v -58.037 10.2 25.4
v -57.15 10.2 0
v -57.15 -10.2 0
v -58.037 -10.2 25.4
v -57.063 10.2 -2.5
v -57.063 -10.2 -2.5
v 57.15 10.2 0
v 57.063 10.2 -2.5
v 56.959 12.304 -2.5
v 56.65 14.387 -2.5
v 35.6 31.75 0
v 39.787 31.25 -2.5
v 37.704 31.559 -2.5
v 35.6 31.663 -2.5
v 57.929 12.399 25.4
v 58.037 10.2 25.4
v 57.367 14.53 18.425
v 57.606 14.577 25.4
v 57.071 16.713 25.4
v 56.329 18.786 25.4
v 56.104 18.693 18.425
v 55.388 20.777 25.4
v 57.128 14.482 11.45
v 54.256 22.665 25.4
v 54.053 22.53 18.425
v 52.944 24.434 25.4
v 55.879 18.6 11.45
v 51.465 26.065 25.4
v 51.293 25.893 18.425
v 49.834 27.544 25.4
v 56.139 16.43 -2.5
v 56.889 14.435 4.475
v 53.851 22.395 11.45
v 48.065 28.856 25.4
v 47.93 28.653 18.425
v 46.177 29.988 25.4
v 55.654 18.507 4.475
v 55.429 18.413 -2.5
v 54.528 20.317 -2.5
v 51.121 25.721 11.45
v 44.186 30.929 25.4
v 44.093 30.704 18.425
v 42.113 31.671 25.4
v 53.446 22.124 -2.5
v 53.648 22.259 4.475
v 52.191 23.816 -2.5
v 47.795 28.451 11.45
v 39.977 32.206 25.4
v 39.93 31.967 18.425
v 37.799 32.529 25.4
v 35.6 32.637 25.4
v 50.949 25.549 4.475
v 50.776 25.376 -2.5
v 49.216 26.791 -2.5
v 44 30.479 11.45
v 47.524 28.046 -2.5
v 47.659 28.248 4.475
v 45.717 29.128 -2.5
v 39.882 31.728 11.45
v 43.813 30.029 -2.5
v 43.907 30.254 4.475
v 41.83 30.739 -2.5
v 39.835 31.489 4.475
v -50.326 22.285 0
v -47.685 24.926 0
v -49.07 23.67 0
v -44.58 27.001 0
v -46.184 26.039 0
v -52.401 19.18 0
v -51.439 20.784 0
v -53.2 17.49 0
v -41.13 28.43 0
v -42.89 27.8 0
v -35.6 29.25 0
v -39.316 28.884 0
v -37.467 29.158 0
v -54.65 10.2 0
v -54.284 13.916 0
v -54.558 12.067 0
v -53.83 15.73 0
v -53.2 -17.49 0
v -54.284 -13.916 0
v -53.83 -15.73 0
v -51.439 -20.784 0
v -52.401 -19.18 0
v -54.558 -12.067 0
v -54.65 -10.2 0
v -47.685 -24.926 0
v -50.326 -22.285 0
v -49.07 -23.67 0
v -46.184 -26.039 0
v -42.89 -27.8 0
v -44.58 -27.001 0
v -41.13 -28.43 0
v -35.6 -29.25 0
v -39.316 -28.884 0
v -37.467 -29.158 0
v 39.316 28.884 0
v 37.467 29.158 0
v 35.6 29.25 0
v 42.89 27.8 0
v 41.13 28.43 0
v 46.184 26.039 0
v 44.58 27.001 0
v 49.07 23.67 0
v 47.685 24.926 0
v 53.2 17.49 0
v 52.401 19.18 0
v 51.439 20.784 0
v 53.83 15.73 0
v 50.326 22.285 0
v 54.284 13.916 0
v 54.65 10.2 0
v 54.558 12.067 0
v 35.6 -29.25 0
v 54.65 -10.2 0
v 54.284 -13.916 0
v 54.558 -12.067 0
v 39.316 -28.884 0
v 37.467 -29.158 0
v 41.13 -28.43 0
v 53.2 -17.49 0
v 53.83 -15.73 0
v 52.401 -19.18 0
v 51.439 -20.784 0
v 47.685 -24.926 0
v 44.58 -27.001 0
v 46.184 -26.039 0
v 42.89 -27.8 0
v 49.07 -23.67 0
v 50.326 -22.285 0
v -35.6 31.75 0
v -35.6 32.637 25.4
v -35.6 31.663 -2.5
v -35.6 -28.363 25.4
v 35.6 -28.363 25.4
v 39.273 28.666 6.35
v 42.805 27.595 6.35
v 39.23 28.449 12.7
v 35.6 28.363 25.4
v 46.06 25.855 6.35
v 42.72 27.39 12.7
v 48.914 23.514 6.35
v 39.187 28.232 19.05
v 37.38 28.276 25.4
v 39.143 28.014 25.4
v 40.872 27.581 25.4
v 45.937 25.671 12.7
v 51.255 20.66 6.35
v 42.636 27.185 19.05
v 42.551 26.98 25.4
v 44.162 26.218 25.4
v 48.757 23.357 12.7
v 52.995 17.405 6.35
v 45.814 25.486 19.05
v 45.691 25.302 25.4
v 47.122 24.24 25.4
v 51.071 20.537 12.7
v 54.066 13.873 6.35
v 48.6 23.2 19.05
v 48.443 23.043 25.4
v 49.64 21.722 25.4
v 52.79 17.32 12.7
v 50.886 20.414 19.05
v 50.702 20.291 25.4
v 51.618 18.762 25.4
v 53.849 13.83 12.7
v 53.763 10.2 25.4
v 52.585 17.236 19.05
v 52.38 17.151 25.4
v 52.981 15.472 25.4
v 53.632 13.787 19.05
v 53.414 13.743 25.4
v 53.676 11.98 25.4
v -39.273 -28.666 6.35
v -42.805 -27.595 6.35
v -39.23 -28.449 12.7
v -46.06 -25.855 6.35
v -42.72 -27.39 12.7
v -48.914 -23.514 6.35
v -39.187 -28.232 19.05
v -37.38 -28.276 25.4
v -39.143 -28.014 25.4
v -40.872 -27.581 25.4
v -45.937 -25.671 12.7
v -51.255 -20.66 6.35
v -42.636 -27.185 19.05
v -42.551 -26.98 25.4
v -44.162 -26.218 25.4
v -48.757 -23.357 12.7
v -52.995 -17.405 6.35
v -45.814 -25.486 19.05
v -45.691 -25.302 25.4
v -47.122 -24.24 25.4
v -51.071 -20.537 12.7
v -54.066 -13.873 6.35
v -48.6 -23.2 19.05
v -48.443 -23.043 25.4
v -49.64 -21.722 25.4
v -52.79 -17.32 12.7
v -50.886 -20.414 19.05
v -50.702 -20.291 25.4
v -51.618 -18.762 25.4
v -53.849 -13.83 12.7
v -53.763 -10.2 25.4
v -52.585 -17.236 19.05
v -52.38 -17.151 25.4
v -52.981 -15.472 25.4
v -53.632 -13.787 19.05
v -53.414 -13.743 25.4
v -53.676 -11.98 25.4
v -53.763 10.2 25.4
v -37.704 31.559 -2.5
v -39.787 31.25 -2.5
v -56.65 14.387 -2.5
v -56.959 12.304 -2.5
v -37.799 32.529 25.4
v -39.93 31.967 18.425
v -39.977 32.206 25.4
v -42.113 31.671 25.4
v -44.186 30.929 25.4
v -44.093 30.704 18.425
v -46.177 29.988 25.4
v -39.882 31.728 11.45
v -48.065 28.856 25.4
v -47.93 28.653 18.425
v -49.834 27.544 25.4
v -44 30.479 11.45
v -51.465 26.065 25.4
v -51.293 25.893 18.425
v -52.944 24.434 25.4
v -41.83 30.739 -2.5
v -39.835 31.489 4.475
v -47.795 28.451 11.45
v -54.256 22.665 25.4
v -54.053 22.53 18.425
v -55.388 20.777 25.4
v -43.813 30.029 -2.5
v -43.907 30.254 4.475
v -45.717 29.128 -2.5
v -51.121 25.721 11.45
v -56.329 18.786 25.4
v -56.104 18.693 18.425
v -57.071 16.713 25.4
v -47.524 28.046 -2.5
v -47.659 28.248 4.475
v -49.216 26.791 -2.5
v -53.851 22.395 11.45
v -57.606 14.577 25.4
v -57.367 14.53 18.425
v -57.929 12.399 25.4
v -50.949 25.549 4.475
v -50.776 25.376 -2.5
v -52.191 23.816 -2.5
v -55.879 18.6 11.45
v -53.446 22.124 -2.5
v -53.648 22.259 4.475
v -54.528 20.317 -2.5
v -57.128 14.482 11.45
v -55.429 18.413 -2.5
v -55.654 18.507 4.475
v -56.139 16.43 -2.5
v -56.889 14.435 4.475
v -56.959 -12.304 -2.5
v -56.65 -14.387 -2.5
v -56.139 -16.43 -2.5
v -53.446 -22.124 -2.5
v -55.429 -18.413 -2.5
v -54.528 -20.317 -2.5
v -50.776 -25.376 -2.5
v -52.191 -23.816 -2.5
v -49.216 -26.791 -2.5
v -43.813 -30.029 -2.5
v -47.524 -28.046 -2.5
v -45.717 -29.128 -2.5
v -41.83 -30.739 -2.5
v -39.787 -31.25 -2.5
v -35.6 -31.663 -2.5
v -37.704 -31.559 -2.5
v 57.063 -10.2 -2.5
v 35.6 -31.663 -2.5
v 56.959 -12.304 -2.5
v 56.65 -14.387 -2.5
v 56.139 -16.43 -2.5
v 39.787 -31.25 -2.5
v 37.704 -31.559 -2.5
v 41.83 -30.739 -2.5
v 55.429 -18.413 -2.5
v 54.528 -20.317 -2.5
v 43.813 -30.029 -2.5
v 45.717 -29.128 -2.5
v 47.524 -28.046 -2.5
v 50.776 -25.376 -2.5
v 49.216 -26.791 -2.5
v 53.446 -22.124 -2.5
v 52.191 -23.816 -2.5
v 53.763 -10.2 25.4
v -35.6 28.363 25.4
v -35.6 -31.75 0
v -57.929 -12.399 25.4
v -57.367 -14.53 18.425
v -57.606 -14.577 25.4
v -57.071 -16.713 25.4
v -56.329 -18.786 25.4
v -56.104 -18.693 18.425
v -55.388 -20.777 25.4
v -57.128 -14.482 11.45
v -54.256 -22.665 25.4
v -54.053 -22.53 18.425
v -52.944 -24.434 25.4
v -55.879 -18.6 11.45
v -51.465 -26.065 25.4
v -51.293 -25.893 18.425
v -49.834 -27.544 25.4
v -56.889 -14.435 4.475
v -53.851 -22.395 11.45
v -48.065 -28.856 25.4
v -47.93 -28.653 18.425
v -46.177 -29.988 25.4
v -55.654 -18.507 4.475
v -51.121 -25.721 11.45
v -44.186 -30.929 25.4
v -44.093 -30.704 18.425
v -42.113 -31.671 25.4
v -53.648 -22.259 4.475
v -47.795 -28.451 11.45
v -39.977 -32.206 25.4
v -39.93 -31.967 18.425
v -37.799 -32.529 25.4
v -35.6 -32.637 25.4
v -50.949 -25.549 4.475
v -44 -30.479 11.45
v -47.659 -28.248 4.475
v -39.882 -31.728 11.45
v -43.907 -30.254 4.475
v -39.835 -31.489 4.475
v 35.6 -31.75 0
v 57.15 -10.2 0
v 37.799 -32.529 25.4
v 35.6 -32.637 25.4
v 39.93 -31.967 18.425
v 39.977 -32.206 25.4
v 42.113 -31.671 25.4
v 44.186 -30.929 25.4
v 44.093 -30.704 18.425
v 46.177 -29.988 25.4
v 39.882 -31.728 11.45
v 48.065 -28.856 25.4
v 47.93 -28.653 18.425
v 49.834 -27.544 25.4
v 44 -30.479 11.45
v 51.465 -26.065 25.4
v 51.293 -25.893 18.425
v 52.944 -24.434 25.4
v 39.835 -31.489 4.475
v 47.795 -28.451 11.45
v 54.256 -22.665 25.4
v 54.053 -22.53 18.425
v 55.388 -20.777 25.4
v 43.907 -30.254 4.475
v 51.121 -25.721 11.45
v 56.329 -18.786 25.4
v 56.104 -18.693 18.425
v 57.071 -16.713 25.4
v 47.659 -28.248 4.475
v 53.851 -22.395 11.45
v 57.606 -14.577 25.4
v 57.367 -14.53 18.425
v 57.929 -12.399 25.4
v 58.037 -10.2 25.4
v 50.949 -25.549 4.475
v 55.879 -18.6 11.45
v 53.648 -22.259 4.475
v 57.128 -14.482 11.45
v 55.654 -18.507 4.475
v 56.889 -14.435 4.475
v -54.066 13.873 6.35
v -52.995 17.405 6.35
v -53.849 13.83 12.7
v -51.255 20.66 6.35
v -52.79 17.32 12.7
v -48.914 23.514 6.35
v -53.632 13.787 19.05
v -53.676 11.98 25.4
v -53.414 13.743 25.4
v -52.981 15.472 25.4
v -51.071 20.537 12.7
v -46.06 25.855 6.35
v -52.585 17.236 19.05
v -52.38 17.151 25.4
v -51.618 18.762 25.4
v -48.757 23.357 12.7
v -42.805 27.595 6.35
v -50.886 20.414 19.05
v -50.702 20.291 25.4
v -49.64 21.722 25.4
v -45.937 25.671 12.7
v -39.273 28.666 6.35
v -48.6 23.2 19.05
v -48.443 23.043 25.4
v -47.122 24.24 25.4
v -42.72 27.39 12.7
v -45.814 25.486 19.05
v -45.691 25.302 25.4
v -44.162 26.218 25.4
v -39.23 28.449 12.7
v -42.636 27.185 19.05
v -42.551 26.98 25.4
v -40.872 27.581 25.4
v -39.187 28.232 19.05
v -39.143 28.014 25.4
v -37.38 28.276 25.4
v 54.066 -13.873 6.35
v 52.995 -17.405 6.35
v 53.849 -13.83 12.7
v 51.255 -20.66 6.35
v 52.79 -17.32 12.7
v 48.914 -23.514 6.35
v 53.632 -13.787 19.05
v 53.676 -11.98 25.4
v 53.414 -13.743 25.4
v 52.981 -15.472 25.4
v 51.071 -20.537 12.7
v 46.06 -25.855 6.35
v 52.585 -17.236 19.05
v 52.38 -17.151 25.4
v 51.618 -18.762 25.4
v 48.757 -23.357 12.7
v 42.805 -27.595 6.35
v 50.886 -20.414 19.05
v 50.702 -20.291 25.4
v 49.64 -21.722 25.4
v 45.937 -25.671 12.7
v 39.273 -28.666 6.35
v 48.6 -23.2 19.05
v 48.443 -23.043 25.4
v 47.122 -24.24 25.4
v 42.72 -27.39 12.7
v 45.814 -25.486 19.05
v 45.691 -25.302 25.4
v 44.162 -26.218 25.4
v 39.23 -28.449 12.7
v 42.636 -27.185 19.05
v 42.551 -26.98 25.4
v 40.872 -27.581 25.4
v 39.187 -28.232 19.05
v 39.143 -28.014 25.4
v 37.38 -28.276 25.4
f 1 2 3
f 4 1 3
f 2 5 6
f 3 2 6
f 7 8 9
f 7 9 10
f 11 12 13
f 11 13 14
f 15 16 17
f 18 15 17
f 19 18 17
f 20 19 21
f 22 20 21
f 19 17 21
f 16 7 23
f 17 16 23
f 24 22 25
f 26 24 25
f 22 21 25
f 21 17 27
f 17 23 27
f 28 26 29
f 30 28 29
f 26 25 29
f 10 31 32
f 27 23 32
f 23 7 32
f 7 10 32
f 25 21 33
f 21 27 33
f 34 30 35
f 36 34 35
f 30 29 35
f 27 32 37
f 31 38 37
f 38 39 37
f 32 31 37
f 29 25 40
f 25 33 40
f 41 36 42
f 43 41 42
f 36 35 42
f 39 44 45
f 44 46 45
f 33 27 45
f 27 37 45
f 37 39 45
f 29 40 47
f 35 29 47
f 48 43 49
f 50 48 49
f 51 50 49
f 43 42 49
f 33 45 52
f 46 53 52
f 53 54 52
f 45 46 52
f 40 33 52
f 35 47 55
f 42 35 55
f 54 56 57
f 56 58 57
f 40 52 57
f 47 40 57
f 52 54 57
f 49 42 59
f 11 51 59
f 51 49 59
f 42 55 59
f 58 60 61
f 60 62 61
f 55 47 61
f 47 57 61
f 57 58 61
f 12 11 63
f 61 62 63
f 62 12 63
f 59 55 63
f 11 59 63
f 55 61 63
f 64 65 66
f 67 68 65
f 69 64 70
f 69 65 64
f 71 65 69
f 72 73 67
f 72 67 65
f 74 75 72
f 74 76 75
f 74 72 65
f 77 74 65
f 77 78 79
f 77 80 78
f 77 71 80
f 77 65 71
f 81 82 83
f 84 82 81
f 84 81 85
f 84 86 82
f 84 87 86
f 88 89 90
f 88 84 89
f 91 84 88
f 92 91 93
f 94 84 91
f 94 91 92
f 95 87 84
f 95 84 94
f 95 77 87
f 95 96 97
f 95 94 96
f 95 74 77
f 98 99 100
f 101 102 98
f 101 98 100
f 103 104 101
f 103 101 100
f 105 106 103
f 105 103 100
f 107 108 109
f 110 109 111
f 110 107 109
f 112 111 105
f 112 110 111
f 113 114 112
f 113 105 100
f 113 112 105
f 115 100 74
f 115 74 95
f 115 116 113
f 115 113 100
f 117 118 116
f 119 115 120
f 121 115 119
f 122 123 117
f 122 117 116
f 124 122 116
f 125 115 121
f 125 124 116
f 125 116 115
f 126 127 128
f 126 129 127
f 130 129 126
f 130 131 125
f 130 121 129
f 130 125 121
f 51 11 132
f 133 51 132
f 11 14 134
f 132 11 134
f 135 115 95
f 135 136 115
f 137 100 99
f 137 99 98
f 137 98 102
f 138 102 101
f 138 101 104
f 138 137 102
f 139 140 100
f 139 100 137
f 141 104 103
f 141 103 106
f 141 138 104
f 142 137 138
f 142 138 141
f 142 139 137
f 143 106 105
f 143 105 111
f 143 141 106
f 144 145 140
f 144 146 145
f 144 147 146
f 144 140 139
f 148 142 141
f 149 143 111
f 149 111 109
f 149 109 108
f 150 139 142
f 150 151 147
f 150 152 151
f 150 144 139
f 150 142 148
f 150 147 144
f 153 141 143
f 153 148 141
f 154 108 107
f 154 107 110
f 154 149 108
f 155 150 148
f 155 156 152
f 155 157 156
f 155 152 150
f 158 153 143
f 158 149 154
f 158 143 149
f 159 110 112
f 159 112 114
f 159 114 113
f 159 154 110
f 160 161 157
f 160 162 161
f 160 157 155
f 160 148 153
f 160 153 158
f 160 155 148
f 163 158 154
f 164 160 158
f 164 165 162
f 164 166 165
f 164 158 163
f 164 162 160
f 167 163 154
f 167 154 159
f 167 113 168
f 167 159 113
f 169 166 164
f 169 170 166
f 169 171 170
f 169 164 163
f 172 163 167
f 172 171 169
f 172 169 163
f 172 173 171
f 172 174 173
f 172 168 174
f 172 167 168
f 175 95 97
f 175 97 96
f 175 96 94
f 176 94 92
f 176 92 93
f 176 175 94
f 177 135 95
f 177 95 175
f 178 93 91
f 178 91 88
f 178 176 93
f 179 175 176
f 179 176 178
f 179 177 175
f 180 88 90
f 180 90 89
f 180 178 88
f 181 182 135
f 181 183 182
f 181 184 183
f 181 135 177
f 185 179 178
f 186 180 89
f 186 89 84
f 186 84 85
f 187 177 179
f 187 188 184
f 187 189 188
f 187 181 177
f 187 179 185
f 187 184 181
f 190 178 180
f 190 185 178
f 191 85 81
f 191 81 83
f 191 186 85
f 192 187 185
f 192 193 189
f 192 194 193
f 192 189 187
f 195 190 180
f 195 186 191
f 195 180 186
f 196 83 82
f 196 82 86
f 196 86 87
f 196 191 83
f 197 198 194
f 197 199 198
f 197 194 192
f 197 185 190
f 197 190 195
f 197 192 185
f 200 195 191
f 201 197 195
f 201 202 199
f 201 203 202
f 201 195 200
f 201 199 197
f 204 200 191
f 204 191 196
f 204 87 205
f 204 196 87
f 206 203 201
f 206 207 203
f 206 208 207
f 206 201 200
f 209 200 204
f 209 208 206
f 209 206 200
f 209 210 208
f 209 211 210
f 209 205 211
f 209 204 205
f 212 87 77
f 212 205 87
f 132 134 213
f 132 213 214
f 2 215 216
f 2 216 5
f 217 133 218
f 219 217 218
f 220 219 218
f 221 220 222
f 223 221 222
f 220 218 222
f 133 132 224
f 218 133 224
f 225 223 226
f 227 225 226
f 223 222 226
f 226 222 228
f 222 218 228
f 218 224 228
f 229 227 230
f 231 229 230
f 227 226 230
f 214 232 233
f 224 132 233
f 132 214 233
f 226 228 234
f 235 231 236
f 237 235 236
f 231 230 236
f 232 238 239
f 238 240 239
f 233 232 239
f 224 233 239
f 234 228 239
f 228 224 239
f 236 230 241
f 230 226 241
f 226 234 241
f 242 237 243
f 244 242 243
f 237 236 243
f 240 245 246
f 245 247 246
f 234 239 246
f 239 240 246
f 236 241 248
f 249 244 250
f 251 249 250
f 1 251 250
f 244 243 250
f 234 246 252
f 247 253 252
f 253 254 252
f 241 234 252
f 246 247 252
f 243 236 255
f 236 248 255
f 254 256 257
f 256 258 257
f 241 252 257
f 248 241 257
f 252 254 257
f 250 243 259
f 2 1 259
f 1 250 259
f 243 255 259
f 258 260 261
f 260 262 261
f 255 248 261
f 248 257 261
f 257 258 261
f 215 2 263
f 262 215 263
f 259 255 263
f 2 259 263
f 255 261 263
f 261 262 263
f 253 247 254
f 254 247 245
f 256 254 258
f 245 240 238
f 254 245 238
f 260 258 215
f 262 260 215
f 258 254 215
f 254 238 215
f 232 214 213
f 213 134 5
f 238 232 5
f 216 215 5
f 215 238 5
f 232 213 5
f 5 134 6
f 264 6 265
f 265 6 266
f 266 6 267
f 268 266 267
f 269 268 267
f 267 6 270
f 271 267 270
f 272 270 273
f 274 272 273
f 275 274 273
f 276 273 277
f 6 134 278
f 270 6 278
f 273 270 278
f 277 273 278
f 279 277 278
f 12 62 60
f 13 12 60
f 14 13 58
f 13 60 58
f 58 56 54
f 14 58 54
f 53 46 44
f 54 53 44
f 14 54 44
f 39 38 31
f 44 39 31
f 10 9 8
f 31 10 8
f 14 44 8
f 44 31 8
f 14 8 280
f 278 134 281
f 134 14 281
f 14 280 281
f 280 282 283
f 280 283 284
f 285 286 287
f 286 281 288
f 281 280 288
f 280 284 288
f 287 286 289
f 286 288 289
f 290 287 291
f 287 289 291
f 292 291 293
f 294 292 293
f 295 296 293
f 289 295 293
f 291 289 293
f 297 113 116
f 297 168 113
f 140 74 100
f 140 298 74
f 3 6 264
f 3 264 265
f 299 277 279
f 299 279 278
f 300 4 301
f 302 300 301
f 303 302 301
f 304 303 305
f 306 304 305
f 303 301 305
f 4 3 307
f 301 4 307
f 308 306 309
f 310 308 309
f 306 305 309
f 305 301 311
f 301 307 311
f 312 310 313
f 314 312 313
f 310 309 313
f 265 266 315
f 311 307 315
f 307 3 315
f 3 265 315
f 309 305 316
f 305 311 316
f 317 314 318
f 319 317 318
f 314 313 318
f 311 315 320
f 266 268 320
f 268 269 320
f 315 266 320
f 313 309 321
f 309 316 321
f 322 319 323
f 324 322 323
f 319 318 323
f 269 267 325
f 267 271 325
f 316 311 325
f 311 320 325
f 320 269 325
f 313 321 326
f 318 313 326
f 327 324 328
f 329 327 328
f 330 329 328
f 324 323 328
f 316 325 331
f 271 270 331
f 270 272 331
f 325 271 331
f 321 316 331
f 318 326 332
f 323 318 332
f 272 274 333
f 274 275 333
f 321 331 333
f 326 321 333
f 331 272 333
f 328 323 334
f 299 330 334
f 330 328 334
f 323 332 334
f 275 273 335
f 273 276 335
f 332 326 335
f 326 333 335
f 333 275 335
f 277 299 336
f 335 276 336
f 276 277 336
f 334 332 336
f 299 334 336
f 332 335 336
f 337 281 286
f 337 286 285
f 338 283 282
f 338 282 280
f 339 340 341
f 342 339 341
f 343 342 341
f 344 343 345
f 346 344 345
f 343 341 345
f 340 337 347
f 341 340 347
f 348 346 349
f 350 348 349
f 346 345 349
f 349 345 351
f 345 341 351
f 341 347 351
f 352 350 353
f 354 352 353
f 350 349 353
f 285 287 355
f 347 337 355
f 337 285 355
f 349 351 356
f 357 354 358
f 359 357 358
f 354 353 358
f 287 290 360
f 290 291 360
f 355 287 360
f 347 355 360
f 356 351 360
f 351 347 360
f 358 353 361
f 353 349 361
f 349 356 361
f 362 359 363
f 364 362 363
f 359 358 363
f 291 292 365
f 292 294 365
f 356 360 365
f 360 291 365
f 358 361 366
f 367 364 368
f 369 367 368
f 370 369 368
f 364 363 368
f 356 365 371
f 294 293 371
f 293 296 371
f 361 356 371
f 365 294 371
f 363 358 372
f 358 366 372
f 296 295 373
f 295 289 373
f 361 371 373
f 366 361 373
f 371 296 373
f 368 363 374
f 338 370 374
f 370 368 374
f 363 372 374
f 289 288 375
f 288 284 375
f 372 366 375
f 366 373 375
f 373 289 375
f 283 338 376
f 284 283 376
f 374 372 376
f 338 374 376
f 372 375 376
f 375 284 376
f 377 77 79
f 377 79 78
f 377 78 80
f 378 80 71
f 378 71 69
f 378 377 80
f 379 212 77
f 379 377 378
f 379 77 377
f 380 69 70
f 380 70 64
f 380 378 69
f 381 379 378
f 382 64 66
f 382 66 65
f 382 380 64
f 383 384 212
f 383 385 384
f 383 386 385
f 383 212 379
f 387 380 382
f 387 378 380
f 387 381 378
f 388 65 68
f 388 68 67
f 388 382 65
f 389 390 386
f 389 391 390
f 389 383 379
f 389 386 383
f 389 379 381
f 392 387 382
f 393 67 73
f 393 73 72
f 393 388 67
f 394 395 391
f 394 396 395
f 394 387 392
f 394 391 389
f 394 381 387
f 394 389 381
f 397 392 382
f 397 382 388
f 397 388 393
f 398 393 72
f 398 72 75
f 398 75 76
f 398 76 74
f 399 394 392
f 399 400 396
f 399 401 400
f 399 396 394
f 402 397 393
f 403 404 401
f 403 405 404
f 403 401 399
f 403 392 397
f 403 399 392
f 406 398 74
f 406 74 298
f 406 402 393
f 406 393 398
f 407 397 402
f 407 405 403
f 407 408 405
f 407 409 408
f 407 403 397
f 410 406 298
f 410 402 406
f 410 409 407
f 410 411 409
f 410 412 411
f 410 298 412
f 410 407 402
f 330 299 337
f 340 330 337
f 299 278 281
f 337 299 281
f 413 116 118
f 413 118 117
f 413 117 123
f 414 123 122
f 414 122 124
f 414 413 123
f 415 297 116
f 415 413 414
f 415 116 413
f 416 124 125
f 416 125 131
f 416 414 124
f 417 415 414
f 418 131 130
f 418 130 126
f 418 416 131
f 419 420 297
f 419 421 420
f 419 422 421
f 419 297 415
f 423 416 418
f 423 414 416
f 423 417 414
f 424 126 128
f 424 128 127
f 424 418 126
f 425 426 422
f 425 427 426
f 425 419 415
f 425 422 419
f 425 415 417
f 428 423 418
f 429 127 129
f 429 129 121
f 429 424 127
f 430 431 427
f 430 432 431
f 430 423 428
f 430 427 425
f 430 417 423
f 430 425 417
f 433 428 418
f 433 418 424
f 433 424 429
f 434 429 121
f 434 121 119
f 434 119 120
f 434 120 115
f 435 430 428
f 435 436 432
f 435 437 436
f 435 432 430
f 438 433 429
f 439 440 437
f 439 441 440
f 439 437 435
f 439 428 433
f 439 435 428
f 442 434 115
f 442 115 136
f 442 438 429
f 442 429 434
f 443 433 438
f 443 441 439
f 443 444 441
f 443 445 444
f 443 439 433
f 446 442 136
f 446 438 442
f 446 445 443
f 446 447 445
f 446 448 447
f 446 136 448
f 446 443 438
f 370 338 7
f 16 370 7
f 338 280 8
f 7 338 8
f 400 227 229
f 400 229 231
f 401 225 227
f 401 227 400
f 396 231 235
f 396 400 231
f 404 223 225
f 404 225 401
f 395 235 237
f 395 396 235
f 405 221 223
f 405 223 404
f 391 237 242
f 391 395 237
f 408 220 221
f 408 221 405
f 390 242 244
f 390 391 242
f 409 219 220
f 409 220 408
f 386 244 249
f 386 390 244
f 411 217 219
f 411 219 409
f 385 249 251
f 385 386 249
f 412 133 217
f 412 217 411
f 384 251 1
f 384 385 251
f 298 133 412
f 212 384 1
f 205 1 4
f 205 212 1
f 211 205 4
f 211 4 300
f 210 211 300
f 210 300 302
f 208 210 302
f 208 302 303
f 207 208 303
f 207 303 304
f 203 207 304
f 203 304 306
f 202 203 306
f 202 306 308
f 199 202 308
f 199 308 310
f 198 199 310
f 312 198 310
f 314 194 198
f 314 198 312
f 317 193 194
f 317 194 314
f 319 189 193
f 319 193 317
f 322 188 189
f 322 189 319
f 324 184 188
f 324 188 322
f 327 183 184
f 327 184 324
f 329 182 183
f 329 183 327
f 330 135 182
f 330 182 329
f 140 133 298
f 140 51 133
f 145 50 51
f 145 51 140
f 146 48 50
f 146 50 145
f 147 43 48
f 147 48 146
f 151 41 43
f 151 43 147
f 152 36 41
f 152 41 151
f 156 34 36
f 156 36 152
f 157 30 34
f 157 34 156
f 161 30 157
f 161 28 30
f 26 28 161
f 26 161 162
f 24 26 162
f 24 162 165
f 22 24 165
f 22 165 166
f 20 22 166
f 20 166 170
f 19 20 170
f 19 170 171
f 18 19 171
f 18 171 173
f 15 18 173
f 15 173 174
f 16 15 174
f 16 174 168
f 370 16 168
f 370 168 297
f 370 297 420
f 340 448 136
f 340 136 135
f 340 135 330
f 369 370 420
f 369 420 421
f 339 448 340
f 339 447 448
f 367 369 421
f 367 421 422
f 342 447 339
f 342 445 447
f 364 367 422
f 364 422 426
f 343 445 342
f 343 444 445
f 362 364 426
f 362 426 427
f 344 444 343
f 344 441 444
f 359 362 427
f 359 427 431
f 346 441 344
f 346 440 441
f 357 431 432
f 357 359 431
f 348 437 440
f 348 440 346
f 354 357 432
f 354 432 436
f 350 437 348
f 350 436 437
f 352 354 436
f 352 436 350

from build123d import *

# Parameters (mm, degrees)
F2_DEPTH = 25.4
F2_TAPER = -2
F4_DEPTH = 2.5
F4_TAPER = 2


with BuildPart() as f2:
    # F1 (on Top) → F2 (new body)
    with BuildSketch(Plane.XY):
        with BuildLine():
            Line((-35.6, -31.75), (35.6, -31.75))
            ThreePointArc((35.6, -31.75), (50.8381511346, -25.4381511346), (57.15, -10.2))
            Line((57.15, -10.2), (57.15, 10.2))
            ThreePointArc((57.15, 10.2), (50.8381511346, 25.4381511346), (35.6, 31.75))
            Line((35.6, 31.75), (-35.6, 31.75))
            ThreePointArc((-35.6, 31.75), (-50.8381511346, 25.4381511346), (-57.15, 10.2))
            Line((-57.15, 10.2), (-57.15, -10.2))
            ThreePointArc((-57.15, -10.2), (-50.8381511346, -25.4381511346), (-35.6, -31.75))
        make_face()
        with BuildLine():
            ThreePointArc((54.65, -10.2), (49.0703841816, -23.6703841816), (35.6, -29.25))
            Line((35.6, -29.25), (-35.6, -29.25))
            ThreePointArc((-35.6, -29.25), (-49.0703841816, -23.6703841816), (-54.65, -10.2))
            Line((-54.65, -10.2), (-54.65, 10.2))
            ThreePointArc((-54.65, 10.2), (-49.0703841816, 23.6703841816), (-35.6, 29.25))
            Line((-35.6, 29.25), (35.6, 29.25))
            ThreePointArc((35.6, 29.25), (49.0703841816, 23.6703841816), (54.65, 10.2))
            Line((54.65, 10.2), (54.65, -10.2))
        make_face(mode=Mode.SUBTRACT)
    extrude(amount=F2_DEPTH, taper=F2_TAPER)

    # F3 (on Top) → F4 (join)
    with BuildSketch(Plane.XY):
        with BuildLine():
            Line((-35.6, -31.75), (35.6, -31.75))
            ThreePointArc((35.6, -31.75), (50.8381511346, -25.4381511346), (57.15, -10.2))
            Line((57.15, -10.2), (57.15, 10.2))
            ThreePointArc((57.15, 10.2), (50.8381511346, 25.4381511346), (35.6, 31.75))
            Line((35.6, 31.75), (-35.6, 31.75))
            ThreePointArc((-35.6, 31.75), (-50.8381511346, 25.4381511346), (-57.15, 10.2))
            Line((-57.15, 10.2), (-57.15, -10.2))
            ThreePointArc((-57.15, -10.2), (-50.8381511346, -25.4381511346), (-35.6, -31.75))
        make_face()
    extrude(amount=-F4_DEPTH, taper=F4_TAPER)


solid = f2.part
